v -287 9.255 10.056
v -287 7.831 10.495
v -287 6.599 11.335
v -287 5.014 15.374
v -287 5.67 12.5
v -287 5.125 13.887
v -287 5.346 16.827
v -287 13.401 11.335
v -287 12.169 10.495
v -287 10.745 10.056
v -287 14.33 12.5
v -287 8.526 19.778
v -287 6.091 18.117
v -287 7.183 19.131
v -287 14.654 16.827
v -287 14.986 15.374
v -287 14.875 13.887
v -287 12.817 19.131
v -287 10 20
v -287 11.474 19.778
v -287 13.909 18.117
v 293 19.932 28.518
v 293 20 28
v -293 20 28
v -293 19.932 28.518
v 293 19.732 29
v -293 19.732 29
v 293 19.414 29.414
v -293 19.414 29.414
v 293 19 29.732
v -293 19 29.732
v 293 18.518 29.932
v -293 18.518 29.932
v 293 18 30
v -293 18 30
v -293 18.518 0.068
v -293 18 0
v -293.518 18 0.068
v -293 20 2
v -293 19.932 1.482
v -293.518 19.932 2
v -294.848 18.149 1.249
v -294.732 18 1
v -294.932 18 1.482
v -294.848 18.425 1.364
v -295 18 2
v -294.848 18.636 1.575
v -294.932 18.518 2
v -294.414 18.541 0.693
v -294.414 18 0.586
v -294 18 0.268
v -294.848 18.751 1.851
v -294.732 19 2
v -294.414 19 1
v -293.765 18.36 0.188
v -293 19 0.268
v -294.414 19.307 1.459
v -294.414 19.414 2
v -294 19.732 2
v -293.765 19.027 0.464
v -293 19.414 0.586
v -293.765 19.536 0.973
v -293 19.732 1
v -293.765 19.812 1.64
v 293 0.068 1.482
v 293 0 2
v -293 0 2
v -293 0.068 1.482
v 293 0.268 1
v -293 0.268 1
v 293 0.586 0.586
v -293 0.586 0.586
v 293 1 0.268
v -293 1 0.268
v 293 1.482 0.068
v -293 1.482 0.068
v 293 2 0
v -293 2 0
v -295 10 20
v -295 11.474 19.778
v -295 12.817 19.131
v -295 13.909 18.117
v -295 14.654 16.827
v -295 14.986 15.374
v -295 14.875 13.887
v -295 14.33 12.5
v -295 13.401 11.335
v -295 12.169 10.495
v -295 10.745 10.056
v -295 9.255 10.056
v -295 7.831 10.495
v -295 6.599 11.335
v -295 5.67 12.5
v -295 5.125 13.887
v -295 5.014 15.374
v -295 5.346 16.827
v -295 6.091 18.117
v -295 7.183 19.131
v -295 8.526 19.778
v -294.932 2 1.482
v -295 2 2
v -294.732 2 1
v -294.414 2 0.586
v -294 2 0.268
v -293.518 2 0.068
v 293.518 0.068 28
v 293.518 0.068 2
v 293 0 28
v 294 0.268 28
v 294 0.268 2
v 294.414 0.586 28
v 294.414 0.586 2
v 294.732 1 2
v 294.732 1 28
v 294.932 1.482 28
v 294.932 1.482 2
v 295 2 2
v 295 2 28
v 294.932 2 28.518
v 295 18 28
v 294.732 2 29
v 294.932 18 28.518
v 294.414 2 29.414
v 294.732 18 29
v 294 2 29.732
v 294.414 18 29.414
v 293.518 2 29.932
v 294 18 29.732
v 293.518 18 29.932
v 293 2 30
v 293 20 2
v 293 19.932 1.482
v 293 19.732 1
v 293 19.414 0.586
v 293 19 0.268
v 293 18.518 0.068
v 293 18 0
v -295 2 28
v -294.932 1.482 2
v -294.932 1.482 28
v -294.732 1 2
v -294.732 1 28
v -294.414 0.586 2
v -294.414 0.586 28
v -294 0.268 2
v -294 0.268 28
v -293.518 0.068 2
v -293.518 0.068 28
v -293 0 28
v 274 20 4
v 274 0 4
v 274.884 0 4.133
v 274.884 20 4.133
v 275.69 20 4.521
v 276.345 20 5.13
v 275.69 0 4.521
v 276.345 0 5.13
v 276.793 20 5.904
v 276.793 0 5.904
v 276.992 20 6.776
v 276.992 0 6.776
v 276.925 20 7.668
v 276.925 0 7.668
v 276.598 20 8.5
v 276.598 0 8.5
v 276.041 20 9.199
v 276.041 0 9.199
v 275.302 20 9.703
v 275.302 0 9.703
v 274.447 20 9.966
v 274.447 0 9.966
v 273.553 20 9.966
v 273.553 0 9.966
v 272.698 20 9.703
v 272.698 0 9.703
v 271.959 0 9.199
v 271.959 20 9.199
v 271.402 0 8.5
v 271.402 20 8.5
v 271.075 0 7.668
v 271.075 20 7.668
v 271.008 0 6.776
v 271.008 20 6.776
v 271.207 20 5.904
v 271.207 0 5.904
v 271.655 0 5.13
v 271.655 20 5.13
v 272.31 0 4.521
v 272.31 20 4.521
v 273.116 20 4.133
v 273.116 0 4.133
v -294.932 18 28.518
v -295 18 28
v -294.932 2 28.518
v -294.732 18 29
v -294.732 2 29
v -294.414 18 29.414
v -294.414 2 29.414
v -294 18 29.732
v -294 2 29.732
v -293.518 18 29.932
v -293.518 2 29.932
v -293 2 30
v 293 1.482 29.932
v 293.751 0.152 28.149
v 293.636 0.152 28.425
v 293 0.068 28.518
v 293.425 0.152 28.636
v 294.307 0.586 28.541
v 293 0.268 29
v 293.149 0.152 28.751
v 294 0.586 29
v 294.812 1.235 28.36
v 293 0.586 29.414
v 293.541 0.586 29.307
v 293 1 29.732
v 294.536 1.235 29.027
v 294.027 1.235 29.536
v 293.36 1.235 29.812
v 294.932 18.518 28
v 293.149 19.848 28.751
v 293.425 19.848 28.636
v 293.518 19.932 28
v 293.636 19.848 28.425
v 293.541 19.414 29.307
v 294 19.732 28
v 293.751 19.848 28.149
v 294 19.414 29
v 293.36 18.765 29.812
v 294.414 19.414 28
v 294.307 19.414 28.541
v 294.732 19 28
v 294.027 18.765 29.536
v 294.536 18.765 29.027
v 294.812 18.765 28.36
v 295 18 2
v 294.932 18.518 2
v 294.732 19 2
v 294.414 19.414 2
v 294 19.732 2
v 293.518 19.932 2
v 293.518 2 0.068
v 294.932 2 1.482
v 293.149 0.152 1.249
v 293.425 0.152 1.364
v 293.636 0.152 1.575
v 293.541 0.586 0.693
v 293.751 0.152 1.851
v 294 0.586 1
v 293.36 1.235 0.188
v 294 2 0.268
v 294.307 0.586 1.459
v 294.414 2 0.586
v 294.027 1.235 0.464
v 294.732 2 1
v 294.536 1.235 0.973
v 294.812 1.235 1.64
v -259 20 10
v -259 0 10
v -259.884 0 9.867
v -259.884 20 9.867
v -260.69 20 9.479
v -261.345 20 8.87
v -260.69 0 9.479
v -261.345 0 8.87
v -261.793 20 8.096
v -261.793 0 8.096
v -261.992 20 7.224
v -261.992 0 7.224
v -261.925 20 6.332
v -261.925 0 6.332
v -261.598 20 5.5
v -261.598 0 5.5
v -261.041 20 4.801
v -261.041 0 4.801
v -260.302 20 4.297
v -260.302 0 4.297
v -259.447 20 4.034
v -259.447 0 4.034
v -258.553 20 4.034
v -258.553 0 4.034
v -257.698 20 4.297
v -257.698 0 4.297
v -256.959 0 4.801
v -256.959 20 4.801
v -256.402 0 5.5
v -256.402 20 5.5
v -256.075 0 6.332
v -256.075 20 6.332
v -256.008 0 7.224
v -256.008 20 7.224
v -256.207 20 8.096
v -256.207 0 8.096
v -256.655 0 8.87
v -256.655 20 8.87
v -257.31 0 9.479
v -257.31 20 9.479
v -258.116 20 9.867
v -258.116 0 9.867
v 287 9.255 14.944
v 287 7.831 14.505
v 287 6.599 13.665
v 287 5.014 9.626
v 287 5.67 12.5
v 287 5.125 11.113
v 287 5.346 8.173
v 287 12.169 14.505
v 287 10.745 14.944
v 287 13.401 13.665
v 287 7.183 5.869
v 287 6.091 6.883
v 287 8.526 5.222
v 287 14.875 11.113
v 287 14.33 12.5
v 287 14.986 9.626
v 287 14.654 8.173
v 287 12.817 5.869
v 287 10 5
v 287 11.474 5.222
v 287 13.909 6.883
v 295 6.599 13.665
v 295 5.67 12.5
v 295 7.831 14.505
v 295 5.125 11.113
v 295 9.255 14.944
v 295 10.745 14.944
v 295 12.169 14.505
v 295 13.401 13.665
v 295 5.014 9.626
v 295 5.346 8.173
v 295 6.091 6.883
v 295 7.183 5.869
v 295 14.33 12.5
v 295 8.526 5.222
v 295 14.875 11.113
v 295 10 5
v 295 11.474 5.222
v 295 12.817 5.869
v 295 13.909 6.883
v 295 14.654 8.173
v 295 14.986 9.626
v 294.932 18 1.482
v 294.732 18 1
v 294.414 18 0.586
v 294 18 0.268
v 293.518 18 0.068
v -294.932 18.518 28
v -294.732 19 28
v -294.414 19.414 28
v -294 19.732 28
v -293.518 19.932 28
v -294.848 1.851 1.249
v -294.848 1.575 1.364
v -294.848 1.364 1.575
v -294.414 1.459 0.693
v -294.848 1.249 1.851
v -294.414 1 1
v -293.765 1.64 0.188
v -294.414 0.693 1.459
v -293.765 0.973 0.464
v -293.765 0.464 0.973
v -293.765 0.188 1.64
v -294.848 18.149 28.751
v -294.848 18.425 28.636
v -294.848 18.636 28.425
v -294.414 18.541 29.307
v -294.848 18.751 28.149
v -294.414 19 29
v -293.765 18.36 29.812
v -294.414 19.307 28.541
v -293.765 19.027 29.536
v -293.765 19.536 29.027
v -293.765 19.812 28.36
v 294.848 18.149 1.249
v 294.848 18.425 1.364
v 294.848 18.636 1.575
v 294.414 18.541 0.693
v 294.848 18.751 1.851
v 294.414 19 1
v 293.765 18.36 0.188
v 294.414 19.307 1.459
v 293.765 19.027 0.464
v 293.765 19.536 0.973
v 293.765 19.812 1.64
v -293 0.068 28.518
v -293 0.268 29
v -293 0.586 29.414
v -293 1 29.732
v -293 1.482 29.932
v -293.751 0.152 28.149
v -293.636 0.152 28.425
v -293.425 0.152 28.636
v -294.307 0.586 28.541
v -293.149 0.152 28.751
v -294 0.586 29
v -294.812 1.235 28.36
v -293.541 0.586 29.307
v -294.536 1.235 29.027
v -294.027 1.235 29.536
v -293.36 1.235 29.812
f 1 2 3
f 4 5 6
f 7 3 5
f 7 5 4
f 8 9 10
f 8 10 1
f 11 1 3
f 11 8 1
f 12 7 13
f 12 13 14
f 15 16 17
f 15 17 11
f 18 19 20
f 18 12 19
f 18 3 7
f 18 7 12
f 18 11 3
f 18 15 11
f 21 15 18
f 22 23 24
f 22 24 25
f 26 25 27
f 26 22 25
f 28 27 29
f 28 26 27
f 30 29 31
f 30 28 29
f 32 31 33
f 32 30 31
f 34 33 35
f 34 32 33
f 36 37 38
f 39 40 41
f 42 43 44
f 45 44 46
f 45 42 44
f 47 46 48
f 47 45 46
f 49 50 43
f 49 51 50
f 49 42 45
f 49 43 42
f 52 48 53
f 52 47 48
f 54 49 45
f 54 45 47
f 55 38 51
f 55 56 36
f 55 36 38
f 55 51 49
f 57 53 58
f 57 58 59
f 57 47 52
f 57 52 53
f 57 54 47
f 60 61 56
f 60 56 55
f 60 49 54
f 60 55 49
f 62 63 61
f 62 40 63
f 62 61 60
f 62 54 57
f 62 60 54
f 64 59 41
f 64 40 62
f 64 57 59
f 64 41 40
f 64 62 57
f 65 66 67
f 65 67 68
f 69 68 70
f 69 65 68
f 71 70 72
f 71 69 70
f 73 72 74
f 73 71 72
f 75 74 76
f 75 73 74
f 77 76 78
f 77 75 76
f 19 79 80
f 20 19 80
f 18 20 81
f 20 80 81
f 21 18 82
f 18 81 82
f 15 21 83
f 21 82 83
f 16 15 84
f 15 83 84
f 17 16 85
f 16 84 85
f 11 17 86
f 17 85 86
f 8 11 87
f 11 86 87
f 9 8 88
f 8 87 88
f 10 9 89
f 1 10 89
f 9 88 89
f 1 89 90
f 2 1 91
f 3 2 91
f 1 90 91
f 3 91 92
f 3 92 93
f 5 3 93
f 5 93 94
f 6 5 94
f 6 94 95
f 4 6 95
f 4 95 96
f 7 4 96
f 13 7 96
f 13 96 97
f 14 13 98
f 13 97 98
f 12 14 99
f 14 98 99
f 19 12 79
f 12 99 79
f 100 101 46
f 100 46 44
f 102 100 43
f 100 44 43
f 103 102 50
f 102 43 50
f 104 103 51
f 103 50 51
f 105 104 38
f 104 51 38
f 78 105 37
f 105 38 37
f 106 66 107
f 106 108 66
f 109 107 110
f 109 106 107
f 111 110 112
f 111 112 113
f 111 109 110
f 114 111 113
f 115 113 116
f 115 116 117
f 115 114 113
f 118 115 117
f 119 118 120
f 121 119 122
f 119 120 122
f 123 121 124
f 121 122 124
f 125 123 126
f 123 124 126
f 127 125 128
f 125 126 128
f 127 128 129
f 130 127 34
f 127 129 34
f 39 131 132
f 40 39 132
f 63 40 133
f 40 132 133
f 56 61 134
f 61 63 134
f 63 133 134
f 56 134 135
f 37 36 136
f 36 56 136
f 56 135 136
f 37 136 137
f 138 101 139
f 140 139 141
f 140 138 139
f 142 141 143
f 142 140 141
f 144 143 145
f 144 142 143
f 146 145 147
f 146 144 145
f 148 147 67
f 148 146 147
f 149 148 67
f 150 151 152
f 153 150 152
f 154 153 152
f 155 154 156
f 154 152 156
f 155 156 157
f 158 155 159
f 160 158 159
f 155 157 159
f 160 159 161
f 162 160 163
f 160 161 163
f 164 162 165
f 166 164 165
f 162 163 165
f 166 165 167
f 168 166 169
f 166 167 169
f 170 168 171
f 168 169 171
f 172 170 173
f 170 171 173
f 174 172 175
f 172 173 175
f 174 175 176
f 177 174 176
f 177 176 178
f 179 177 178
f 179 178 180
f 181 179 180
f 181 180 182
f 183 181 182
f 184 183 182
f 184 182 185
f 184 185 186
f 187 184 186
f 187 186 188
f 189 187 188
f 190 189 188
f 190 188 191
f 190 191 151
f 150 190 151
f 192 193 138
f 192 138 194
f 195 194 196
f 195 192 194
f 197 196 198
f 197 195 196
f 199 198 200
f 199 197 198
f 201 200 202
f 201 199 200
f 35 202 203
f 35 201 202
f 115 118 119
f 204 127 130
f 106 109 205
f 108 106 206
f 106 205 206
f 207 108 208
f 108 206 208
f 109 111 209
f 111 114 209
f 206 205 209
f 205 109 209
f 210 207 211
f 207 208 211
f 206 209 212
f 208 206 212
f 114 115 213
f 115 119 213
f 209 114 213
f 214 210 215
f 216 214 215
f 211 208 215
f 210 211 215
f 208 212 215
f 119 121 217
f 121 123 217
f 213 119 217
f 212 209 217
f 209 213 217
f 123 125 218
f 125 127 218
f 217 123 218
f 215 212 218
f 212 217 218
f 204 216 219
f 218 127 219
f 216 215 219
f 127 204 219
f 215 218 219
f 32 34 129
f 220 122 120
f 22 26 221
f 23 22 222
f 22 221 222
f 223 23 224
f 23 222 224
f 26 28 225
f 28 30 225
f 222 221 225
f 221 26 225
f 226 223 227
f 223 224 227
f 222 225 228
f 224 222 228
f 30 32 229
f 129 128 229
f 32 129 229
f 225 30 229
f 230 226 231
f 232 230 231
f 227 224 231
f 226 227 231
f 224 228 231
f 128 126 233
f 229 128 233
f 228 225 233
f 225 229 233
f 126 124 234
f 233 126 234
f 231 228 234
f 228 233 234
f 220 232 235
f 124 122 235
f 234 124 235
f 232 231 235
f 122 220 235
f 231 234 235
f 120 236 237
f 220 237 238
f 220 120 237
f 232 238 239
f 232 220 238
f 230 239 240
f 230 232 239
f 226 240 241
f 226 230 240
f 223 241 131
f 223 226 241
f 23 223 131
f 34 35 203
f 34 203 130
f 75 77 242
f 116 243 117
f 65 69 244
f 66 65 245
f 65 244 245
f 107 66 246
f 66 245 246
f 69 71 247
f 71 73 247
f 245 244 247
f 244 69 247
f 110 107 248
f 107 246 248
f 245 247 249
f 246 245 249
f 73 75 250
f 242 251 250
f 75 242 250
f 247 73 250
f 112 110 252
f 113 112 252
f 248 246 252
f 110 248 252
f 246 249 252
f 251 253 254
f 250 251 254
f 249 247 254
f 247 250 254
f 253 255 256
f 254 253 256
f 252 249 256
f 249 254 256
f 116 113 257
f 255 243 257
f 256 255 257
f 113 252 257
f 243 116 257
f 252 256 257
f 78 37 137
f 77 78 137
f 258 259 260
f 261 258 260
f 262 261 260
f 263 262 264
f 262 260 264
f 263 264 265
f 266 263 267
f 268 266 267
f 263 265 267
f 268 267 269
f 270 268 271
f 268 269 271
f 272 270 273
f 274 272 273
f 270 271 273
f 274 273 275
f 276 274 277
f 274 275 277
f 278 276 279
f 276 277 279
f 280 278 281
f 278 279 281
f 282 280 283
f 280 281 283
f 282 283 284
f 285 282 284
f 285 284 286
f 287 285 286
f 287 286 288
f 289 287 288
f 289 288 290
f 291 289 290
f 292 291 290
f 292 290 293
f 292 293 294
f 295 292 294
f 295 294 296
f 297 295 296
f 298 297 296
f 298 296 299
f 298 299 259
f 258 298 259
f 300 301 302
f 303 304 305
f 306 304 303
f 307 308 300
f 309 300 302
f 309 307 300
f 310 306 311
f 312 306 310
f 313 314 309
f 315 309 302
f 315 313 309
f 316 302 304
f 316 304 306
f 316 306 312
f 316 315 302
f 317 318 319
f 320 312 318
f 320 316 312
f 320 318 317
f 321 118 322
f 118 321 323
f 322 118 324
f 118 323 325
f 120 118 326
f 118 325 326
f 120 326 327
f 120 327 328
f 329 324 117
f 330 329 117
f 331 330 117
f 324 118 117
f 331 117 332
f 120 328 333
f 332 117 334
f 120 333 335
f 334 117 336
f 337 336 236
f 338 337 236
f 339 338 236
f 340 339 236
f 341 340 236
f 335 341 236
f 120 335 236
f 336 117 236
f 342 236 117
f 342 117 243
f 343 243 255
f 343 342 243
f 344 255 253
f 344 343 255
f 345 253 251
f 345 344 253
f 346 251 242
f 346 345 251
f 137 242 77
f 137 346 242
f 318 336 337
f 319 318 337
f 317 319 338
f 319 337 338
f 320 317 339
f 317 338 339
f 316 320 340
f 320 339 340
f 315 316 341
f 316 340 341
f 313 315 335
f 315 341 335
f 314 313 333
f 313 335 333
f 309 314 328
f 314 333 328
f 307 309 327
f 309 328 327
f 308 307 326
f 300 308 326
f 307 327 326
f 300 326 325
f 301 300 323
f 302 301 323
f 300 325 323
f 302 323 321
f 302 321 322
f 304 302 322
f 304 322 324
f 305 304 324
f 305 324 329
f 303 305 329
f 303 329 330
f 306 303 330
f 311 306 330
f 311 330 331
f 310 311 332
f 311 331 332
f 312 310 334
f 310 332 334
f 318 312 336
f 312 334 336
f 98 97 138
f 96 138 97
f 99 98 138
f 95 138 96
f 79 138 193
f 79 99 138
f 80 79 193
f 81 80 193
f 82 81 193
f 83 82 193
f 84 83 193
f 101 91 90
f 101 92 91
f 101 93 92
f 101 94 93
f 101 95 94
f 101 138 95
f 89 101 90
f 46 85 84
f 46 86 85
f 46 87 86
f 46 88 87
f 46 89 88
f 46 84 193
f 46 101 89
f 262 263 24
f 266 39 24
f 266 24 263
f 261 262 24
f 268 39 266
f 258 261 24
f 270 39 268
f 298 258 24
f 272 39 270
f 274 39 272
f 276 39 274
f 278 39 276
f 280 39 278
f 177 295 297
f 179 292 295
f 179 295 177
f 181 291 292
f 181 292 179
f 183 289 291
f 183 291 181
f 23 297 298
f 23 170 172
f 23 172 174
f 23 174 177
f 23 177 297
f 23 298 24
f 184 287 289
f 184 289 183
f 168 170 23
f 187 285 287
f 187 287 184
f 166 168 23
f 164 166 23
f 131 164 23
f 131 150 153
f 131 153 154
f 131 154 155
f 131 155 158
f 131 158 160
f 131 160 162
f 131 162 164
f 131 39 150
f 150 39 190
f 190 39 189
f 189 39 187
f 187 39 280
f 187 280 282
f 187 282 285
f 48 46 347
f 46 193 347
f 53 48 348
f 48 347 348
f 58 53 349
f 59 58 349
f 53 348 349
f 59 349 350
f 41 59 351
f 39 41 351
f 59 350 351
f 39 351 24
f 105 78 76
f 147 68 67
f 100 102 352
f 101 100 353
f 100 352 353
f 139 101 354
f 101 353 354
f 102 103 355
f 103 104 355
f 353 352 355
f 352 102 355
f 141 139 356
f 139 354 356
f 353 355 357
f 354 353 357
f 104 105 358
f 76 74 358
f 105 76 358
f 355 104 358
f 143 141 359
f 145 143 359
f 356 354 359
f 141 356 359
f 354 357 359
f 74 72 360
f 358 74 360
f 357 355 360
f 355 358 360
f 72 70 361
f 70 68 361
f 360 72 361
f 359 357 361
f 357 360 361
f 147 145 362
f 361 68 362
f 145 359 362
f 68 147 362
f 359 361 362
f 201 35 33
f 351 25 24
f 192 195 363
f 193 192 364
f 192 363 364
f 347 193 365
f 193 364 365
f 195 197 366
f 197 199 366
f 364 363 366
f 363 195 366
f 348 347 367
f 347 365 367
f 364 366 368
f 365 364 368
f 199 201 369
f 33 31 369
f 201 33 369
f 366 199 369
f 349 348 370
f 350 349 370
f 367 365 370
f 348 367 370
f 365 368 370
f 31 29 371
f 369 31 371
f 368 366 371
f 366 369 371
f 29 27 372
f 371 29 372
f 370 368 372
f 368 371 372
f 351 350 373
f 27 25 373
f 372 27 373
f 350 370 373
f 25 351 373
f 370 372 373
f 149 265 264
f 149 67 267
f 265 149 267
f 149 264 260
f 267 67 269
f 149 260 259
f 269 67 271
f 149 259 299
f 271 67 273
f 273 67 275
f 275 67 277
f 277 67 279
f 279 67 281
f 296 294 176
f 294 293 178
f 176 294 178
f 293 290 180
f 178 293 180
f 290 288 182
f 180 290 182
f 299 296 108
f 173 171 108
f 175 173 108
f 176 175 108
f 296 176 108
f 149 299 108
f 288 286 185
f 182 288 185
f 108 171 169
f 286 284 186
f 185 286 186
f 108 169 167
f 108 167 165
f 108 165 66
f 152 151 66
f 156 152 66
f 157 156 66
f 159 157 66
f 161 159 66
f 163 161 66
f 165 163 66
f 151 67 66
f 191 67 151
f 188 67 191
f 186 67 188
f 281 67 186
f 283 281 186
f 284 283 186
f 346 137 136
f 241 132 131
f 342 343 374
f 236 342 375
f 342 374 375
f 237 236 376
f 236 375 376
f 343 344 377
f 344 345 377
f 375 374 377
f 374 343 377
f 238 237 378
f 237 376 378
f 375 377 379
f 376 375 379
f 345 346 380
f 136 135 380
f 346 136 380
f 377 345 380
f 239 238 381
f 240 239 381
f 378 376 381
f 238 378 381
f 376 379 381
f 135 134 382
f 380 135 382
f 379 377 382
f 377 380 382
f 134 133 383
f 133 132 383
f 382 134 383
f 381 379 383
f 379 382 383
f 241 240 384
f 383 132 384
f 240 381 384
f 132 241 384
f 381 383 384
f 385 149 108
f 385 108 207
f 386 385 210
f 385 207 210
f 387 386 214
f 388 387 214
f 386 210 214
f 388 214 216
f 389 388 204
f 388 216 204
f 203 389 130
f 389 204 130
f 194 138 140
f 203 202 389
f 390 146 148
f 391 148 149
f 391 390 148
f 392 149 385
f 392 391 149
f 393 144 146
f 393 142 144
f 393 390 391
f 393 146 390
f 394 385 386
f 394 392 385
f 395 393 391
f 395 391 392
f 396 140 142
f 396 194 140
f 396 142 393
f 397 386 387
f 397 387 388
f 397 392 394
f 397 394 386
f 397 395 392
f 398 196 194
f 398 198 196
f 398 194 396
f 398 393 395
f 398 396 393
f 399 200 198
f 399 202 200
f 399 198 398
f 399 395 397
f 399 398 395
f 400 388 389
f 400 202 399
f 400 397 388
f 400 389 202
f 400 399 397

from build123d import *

# Parameters (mm, degrees)
SKETCH1_W           = 590
SKETCH1_H           = 20
BOSS_EXTRUDE1_DEPTH = 30
FILLET1_R           = 2
SKETCH6_R           = 5
CUT_EXTRUDE5_DEPTH  = 8
SKETCH7_R           = 5
CUT_EXTRUDE6_DEPTH  = 8
SKETCH8_R           = 3
CUT_EXTRUDE7_DEPTH  = 298.195222034


with BuildPart() as part:
    # Sketch1 → Boss-Extrude1 (new body)
    with BuildSketch(Plane.XY):
        with Locations((0, 10)):
            Rectangle(SKETCH1_W, SKETCH1_H)
    extrude(amount=BOSS_EXTRUDE1_DEPTH)

    # Fillet1
    fillet1_edges = [part.edges().sort_by_distance(p)[0] for p in [
        (295, 10, 30),
        (0, 20, 30),
        (-295, 10, 30),
        (0, 20, 0),
        (295, 10, 0),
        (0, 0, 0),
        (-295, 10, 0),
        (-295, 20, 15),
        (295, 20, 15),
        (295, 0, 15),
        (-295, 0, 15),
        (0, 0, 30),
    ]]
    fillet(fillet1_edges, radius=FILLET1_R)

    # Sketch6 → Cut-Extrude5 (cut)
    with BuildSketch(Plane(origin=(295, 0, 0), x_dir=(0, 0, -1), z_dir=(1, 0, 0))):
        with Locations((-10, 10)):
            Circle(SKETCH6_R)
    extrude(amount=-CUT_EXTRUDE5_DEPTH, mode=Mode.SUBTRACT)

    # Sketch7 → Cut-Extrude6 (cut)
    with BuildSketch(Plane.ZY.offset(295)):
        with Locations((15, 10)):
            Circle(SKETCH7_R)
    extrude(amount=-CUT_EXTRUDE6_DEPTH, mode=Mode.SUBTRACT)

    # Sketch8 → Cut-Extrude7 (cut, through all)
    with BuildSketch(Plane.XZ):
        with Locations(Location((-259, 7, 0), (0, 0, 90))):
            Circle(SKETCH8_R)
        with Locations(Location((274, 7, 0), (0, 0, 270))):
            Circle(SKETCH8_R)
    extrude(amount=-CUT_EXTRUDE7_DEPTH, mode=Mode.SUBTRACT)


solid = part.part
